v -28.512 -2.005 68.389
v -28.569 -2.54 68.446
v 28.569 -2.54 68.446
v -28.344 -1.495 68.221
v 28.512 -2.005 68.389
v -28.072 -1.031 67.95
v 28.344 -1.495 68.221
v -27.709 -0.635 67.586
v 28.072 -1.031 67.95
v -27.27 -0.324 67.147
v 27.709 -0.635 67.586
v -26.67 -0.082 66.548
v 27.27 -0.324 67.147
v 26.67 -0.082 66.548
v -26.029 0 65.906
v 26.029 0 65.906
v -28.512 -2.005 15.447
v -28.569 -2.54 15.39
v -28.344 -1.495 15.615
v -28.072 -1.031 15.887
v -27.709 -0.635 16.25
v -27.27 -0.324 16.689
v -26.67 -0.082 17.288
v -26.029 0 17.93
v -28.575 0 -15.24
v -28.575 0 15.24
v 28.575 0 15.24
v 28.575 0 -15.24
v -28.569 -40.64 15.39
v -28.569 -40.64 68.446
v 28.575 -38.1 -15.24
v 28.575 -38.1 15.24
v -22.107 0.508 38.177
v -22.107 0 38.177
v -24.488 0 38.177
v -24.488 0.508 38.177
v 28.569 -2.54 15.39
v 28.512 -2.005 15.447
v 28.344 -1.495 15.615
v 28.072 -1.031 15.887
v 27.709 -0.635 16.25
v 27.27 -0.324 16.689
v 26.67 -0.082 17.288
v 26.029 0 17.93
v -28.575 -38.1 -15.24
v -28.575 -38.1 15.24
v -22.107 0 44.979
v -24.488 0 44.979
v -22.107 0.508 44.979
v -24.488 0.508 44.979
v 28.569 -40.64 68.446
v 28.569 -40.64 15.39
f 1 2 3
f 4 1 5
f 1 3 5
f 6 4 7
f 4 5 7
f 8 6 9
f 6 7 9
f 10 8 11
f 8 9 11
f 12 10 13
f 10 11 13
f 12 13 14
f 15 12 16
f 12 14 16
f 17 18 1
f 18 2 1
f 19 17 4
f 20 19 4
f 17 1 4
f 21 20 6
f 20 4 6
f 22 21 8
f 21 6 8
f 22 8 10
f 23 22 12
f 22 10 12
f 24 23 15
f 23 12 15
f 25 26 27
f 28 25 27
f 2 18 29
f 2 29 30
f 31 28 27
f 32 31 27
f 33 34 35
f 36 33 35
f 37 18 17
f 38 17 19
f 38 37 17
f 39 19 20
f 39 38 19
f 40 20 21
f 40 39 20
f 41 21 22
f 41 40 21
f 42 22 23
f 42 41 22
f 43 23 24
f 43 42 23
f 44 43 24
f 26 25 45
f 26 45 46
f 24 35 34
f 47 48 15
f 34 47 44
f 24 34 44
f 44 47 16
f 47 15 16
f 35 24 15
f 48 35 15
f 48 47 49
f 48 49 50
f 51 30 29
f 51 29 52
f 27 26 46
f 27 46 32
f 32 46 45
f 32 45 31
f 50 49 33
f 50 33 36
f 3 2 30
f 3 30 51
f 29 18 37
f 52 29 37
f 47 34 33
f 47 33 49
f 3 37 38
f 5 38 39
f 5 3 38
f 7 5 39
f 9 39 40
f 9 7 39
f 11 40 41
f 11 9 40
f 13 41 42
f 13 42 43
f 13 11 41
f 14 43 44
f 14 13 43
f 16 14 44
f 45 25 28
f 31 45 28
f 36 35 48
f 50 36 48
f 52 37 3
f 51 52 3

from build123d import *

# Parameters (mm, degrees)
F0_W     = 57.15
F0_H     = 30.48
F1_DEPTH = 38.1
F2_W     = 57.137854
F2_H     = 53.056581
F3_DEPTH = 40.64
F4_R     = 2.54
F5_W     = 2.380744
F5_H     = 6.80212
F6_DEPTH = 0.508


with BuildPart() as f1:
    # F0 (on Front) → F1 (new body)
    with BuildSketch(Plane.XZ):
        Rectangle(F0_W, F0_H)
    extrude(amount=F1_DEPTH)


with BuildPart() as f3:
    # F2 (on Front) → F3 (new body)
    with BuildSketch(Plane.XZ):
        with Locations((0, 41.918099)):
            Rectangle(F2_W, F2_H)
    extrude(amount=F3_DEPTH)

    # F4
    f4_edges = [f3.edges().sort_by_distance(p)[0] for p in [
        (0, 0, 15.389809),
        (28.568927, 0, 41.9181),
        (0, 0, 68.44639),
        (-28.568927, 0, 41.9181),
    ]]
    fillet(f4_edges, radius=F4_R)

    # F5 (on face) → F6 (join)
    with BuildSketch(Plane(origin=(0, 0, 0), x_dir=(-1, 0, 0), z_dir=(0, 1, 0))):
        with Locations((23.29728, 41.577991)):
            Rectangle(F5_W, F5_H)
    extrude(amount=F6_DEPTH)


solid = Compound([f1.part, f3.part])
